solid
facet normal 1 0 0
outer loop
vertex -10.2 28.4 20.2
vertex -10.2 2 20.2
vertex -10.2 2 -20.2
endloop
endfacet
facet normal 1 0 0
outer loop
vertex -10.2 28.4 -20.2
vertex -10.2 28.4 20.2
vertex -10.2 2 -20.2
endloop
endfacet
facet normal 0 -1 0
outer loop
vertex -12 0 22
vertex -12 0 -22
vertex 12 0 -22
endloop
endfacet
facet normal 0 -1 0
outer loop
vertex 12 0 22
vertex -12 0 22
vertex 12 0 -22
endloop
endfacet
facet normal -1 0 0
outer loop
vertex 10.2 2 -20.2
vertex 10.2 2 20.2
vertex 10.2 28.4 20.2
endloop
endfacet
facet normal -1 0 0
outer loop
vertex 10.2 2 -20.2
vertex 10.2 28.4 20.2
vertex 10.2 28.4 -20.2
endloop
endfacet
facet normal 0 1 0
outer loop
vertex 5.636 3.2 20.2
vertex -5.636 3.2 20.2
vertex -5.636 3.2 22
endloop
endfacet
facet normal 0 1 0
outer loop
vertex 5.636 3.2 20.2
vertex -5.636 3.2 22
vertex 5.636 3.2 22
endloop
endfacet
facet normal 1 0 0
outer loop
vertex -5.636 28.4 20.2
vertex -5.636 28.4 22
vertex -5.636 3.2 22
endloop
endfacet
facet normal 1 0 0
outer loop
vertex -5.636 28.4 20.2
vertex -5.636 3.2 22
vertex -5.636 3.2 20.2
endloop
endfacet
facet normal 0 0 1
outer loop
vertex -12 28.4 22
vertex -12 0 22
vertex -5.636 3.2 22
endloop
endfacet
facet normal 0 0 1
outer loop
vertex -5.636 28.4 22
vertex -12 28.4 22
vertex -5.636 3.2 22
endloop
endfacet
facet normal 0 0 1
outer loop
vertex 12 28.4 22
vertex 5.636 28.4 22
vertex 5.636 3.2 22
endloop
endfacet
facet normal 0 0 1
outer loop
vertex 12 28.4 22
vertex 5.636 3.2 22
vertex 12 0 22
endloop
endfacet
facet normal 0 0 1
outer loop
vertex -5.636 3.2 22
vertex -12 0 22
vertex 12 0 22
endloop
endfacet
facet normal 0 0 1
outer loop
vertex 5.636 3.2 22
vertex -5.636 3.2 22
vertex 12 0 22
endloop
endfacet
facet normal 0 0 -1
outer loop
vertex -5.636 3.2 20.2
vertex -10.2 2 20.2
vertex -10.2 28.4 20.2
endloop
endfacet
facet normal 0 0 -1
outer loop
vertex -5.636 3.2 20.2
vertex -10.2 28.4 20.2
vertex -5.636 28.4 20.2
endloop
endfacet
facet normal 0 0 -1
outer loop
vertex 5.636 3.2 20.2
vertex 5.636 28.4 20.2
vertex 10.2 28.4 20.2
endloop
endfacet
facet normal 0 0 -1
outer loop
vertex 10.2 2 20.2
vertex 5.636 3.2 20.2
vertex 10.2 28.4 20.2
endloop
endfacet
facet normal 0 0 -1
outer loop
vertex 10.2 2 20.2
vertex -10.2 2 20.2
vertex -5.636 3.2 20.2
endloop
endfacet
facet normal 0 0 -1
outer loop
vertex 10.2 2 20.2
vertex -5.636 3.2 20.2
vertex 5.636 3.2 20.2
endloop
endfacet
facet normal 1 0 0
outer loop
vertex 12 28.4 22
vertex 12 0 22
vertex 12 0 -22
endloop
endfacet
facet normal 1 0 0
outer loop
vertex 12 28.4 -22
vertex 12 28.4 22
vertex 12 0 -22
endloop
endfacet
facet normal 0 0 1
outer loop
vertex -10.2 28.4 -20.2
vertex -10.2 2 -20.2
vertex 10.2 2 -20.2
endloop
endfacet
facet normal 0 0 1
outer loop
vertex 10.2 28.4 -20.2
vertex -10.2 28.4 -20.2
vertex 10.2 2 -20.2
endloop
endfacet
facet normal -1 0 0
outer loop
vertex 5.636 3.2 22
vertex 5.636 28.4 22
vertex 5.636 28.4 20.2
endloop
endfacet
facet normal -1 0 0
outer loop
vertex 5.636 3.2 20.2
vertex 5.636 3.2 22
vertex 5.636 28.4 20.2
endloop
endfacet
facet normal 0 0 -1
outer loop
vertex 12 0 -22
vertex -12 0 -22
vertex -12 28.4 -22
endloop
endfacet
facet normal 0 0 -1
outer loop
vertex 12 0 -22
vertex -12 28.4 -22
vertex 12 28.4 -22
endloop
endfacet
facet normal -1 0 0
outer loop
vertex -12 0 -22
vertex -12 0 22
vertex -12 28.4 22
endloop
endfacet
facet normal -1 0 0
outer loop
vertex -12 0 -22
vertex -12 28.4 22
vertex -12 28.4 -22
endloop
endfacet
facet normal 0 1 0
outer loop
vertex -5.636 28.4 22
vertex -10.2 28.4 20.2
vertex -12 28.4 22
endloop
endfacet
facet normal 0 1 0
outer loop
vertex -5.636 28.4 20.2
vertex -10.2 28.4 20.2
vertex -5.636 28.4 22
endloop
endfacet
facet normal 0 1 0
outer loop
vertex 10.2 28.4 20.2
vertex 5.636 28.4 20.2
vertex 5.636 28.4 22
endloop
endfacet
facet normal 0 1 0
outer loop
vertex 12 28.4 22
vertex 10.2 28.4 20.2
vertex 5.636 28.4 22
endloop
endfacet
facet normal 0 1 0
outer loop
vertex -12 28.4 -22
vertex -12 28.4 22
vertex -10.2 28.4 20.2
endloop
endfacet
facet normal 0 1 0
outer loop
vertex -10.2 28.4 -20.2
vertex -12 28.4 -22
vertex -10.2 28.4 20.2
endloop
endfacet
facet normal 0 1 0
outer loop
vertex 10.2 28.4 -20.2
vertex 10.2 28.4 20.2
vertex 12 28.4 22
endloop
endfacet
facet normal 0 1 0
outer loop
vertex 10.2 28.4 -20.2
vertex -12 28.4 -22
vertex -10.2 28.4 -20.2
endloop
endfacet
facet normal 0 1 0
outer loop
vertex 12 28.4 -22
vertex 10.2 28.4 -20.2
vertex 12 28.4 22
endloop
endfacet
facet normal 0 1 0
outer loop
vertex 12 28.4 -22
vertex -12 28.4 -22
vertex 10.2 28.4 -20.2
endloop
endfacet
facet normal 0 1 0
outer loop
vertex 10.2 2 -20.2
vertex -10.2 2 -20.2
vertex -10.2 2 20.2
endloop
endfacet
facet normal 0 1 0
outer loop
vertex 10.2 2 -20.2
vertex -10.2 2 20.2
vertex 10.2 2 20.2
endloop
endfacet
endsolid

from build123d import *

# Parameters (mm, degrees)
SKETCH1_W           = 24
SKETCH1_H           = 44
SKETCH1_W_2         = 20.4
SKETCH1_H_2         = 40.4
EXTRUDE_THIN1_DEPTH = 28.4
SKETCH1_2_W         = 20.4
SKETCH1_2_H         = 40.4
BOSS_EXTRUDE1_DEPTH = 2
SKETCH3_W           = 11.27257677
SKETCH3_H           = 19.344298407
CUT_EXTRUDE1_DEPTH  = 25.2


with BuildPart() as part:
    # Sketch1 → Extrude-Thin1 (new body)
    with BuildSketch(Plane(origin=(0, 0, 0), x_dir=(1, 0, 0), z_dir=(0, 1, 0))):
        Rectangle(SKETCH1_W, SKETCH1_H)
        Rectangle(SKETCH1_W_2, SKETCH1_H_2, mode=Mode.SUBTRACT)
    extrude(amount=EXTRUDE_THIN1_DEPTH)

    # Sketch1<2> → Boss-Extrude1 (add)
    with BuildSketch(Plane(origin=(0, 0, 0), x_dir=(1, 0, 0), z_dir=(0, 1, 0))):
        Rectangle(SKETCH1_2_W, SKETCH1_2_H)
    extrude(amount=BOSS_EXTRUDE1_DEPTH)

    # Sketch3 → Cut-Extrude1 (cut)
    with BuildSketch(Plane(origin=(0, 28.4, 0), x_dir=(1, 0, 0), z_dir=(0, 1, 0))):
        with Locations((0, -24.608973671)):
            Rectangle(SKETCH3_W, SKETCH3_H)
    extrude(amount=-CUT_EXTRUDE1_DEPTH, mode=Mode.SUBTRACT)


solid = part.part
